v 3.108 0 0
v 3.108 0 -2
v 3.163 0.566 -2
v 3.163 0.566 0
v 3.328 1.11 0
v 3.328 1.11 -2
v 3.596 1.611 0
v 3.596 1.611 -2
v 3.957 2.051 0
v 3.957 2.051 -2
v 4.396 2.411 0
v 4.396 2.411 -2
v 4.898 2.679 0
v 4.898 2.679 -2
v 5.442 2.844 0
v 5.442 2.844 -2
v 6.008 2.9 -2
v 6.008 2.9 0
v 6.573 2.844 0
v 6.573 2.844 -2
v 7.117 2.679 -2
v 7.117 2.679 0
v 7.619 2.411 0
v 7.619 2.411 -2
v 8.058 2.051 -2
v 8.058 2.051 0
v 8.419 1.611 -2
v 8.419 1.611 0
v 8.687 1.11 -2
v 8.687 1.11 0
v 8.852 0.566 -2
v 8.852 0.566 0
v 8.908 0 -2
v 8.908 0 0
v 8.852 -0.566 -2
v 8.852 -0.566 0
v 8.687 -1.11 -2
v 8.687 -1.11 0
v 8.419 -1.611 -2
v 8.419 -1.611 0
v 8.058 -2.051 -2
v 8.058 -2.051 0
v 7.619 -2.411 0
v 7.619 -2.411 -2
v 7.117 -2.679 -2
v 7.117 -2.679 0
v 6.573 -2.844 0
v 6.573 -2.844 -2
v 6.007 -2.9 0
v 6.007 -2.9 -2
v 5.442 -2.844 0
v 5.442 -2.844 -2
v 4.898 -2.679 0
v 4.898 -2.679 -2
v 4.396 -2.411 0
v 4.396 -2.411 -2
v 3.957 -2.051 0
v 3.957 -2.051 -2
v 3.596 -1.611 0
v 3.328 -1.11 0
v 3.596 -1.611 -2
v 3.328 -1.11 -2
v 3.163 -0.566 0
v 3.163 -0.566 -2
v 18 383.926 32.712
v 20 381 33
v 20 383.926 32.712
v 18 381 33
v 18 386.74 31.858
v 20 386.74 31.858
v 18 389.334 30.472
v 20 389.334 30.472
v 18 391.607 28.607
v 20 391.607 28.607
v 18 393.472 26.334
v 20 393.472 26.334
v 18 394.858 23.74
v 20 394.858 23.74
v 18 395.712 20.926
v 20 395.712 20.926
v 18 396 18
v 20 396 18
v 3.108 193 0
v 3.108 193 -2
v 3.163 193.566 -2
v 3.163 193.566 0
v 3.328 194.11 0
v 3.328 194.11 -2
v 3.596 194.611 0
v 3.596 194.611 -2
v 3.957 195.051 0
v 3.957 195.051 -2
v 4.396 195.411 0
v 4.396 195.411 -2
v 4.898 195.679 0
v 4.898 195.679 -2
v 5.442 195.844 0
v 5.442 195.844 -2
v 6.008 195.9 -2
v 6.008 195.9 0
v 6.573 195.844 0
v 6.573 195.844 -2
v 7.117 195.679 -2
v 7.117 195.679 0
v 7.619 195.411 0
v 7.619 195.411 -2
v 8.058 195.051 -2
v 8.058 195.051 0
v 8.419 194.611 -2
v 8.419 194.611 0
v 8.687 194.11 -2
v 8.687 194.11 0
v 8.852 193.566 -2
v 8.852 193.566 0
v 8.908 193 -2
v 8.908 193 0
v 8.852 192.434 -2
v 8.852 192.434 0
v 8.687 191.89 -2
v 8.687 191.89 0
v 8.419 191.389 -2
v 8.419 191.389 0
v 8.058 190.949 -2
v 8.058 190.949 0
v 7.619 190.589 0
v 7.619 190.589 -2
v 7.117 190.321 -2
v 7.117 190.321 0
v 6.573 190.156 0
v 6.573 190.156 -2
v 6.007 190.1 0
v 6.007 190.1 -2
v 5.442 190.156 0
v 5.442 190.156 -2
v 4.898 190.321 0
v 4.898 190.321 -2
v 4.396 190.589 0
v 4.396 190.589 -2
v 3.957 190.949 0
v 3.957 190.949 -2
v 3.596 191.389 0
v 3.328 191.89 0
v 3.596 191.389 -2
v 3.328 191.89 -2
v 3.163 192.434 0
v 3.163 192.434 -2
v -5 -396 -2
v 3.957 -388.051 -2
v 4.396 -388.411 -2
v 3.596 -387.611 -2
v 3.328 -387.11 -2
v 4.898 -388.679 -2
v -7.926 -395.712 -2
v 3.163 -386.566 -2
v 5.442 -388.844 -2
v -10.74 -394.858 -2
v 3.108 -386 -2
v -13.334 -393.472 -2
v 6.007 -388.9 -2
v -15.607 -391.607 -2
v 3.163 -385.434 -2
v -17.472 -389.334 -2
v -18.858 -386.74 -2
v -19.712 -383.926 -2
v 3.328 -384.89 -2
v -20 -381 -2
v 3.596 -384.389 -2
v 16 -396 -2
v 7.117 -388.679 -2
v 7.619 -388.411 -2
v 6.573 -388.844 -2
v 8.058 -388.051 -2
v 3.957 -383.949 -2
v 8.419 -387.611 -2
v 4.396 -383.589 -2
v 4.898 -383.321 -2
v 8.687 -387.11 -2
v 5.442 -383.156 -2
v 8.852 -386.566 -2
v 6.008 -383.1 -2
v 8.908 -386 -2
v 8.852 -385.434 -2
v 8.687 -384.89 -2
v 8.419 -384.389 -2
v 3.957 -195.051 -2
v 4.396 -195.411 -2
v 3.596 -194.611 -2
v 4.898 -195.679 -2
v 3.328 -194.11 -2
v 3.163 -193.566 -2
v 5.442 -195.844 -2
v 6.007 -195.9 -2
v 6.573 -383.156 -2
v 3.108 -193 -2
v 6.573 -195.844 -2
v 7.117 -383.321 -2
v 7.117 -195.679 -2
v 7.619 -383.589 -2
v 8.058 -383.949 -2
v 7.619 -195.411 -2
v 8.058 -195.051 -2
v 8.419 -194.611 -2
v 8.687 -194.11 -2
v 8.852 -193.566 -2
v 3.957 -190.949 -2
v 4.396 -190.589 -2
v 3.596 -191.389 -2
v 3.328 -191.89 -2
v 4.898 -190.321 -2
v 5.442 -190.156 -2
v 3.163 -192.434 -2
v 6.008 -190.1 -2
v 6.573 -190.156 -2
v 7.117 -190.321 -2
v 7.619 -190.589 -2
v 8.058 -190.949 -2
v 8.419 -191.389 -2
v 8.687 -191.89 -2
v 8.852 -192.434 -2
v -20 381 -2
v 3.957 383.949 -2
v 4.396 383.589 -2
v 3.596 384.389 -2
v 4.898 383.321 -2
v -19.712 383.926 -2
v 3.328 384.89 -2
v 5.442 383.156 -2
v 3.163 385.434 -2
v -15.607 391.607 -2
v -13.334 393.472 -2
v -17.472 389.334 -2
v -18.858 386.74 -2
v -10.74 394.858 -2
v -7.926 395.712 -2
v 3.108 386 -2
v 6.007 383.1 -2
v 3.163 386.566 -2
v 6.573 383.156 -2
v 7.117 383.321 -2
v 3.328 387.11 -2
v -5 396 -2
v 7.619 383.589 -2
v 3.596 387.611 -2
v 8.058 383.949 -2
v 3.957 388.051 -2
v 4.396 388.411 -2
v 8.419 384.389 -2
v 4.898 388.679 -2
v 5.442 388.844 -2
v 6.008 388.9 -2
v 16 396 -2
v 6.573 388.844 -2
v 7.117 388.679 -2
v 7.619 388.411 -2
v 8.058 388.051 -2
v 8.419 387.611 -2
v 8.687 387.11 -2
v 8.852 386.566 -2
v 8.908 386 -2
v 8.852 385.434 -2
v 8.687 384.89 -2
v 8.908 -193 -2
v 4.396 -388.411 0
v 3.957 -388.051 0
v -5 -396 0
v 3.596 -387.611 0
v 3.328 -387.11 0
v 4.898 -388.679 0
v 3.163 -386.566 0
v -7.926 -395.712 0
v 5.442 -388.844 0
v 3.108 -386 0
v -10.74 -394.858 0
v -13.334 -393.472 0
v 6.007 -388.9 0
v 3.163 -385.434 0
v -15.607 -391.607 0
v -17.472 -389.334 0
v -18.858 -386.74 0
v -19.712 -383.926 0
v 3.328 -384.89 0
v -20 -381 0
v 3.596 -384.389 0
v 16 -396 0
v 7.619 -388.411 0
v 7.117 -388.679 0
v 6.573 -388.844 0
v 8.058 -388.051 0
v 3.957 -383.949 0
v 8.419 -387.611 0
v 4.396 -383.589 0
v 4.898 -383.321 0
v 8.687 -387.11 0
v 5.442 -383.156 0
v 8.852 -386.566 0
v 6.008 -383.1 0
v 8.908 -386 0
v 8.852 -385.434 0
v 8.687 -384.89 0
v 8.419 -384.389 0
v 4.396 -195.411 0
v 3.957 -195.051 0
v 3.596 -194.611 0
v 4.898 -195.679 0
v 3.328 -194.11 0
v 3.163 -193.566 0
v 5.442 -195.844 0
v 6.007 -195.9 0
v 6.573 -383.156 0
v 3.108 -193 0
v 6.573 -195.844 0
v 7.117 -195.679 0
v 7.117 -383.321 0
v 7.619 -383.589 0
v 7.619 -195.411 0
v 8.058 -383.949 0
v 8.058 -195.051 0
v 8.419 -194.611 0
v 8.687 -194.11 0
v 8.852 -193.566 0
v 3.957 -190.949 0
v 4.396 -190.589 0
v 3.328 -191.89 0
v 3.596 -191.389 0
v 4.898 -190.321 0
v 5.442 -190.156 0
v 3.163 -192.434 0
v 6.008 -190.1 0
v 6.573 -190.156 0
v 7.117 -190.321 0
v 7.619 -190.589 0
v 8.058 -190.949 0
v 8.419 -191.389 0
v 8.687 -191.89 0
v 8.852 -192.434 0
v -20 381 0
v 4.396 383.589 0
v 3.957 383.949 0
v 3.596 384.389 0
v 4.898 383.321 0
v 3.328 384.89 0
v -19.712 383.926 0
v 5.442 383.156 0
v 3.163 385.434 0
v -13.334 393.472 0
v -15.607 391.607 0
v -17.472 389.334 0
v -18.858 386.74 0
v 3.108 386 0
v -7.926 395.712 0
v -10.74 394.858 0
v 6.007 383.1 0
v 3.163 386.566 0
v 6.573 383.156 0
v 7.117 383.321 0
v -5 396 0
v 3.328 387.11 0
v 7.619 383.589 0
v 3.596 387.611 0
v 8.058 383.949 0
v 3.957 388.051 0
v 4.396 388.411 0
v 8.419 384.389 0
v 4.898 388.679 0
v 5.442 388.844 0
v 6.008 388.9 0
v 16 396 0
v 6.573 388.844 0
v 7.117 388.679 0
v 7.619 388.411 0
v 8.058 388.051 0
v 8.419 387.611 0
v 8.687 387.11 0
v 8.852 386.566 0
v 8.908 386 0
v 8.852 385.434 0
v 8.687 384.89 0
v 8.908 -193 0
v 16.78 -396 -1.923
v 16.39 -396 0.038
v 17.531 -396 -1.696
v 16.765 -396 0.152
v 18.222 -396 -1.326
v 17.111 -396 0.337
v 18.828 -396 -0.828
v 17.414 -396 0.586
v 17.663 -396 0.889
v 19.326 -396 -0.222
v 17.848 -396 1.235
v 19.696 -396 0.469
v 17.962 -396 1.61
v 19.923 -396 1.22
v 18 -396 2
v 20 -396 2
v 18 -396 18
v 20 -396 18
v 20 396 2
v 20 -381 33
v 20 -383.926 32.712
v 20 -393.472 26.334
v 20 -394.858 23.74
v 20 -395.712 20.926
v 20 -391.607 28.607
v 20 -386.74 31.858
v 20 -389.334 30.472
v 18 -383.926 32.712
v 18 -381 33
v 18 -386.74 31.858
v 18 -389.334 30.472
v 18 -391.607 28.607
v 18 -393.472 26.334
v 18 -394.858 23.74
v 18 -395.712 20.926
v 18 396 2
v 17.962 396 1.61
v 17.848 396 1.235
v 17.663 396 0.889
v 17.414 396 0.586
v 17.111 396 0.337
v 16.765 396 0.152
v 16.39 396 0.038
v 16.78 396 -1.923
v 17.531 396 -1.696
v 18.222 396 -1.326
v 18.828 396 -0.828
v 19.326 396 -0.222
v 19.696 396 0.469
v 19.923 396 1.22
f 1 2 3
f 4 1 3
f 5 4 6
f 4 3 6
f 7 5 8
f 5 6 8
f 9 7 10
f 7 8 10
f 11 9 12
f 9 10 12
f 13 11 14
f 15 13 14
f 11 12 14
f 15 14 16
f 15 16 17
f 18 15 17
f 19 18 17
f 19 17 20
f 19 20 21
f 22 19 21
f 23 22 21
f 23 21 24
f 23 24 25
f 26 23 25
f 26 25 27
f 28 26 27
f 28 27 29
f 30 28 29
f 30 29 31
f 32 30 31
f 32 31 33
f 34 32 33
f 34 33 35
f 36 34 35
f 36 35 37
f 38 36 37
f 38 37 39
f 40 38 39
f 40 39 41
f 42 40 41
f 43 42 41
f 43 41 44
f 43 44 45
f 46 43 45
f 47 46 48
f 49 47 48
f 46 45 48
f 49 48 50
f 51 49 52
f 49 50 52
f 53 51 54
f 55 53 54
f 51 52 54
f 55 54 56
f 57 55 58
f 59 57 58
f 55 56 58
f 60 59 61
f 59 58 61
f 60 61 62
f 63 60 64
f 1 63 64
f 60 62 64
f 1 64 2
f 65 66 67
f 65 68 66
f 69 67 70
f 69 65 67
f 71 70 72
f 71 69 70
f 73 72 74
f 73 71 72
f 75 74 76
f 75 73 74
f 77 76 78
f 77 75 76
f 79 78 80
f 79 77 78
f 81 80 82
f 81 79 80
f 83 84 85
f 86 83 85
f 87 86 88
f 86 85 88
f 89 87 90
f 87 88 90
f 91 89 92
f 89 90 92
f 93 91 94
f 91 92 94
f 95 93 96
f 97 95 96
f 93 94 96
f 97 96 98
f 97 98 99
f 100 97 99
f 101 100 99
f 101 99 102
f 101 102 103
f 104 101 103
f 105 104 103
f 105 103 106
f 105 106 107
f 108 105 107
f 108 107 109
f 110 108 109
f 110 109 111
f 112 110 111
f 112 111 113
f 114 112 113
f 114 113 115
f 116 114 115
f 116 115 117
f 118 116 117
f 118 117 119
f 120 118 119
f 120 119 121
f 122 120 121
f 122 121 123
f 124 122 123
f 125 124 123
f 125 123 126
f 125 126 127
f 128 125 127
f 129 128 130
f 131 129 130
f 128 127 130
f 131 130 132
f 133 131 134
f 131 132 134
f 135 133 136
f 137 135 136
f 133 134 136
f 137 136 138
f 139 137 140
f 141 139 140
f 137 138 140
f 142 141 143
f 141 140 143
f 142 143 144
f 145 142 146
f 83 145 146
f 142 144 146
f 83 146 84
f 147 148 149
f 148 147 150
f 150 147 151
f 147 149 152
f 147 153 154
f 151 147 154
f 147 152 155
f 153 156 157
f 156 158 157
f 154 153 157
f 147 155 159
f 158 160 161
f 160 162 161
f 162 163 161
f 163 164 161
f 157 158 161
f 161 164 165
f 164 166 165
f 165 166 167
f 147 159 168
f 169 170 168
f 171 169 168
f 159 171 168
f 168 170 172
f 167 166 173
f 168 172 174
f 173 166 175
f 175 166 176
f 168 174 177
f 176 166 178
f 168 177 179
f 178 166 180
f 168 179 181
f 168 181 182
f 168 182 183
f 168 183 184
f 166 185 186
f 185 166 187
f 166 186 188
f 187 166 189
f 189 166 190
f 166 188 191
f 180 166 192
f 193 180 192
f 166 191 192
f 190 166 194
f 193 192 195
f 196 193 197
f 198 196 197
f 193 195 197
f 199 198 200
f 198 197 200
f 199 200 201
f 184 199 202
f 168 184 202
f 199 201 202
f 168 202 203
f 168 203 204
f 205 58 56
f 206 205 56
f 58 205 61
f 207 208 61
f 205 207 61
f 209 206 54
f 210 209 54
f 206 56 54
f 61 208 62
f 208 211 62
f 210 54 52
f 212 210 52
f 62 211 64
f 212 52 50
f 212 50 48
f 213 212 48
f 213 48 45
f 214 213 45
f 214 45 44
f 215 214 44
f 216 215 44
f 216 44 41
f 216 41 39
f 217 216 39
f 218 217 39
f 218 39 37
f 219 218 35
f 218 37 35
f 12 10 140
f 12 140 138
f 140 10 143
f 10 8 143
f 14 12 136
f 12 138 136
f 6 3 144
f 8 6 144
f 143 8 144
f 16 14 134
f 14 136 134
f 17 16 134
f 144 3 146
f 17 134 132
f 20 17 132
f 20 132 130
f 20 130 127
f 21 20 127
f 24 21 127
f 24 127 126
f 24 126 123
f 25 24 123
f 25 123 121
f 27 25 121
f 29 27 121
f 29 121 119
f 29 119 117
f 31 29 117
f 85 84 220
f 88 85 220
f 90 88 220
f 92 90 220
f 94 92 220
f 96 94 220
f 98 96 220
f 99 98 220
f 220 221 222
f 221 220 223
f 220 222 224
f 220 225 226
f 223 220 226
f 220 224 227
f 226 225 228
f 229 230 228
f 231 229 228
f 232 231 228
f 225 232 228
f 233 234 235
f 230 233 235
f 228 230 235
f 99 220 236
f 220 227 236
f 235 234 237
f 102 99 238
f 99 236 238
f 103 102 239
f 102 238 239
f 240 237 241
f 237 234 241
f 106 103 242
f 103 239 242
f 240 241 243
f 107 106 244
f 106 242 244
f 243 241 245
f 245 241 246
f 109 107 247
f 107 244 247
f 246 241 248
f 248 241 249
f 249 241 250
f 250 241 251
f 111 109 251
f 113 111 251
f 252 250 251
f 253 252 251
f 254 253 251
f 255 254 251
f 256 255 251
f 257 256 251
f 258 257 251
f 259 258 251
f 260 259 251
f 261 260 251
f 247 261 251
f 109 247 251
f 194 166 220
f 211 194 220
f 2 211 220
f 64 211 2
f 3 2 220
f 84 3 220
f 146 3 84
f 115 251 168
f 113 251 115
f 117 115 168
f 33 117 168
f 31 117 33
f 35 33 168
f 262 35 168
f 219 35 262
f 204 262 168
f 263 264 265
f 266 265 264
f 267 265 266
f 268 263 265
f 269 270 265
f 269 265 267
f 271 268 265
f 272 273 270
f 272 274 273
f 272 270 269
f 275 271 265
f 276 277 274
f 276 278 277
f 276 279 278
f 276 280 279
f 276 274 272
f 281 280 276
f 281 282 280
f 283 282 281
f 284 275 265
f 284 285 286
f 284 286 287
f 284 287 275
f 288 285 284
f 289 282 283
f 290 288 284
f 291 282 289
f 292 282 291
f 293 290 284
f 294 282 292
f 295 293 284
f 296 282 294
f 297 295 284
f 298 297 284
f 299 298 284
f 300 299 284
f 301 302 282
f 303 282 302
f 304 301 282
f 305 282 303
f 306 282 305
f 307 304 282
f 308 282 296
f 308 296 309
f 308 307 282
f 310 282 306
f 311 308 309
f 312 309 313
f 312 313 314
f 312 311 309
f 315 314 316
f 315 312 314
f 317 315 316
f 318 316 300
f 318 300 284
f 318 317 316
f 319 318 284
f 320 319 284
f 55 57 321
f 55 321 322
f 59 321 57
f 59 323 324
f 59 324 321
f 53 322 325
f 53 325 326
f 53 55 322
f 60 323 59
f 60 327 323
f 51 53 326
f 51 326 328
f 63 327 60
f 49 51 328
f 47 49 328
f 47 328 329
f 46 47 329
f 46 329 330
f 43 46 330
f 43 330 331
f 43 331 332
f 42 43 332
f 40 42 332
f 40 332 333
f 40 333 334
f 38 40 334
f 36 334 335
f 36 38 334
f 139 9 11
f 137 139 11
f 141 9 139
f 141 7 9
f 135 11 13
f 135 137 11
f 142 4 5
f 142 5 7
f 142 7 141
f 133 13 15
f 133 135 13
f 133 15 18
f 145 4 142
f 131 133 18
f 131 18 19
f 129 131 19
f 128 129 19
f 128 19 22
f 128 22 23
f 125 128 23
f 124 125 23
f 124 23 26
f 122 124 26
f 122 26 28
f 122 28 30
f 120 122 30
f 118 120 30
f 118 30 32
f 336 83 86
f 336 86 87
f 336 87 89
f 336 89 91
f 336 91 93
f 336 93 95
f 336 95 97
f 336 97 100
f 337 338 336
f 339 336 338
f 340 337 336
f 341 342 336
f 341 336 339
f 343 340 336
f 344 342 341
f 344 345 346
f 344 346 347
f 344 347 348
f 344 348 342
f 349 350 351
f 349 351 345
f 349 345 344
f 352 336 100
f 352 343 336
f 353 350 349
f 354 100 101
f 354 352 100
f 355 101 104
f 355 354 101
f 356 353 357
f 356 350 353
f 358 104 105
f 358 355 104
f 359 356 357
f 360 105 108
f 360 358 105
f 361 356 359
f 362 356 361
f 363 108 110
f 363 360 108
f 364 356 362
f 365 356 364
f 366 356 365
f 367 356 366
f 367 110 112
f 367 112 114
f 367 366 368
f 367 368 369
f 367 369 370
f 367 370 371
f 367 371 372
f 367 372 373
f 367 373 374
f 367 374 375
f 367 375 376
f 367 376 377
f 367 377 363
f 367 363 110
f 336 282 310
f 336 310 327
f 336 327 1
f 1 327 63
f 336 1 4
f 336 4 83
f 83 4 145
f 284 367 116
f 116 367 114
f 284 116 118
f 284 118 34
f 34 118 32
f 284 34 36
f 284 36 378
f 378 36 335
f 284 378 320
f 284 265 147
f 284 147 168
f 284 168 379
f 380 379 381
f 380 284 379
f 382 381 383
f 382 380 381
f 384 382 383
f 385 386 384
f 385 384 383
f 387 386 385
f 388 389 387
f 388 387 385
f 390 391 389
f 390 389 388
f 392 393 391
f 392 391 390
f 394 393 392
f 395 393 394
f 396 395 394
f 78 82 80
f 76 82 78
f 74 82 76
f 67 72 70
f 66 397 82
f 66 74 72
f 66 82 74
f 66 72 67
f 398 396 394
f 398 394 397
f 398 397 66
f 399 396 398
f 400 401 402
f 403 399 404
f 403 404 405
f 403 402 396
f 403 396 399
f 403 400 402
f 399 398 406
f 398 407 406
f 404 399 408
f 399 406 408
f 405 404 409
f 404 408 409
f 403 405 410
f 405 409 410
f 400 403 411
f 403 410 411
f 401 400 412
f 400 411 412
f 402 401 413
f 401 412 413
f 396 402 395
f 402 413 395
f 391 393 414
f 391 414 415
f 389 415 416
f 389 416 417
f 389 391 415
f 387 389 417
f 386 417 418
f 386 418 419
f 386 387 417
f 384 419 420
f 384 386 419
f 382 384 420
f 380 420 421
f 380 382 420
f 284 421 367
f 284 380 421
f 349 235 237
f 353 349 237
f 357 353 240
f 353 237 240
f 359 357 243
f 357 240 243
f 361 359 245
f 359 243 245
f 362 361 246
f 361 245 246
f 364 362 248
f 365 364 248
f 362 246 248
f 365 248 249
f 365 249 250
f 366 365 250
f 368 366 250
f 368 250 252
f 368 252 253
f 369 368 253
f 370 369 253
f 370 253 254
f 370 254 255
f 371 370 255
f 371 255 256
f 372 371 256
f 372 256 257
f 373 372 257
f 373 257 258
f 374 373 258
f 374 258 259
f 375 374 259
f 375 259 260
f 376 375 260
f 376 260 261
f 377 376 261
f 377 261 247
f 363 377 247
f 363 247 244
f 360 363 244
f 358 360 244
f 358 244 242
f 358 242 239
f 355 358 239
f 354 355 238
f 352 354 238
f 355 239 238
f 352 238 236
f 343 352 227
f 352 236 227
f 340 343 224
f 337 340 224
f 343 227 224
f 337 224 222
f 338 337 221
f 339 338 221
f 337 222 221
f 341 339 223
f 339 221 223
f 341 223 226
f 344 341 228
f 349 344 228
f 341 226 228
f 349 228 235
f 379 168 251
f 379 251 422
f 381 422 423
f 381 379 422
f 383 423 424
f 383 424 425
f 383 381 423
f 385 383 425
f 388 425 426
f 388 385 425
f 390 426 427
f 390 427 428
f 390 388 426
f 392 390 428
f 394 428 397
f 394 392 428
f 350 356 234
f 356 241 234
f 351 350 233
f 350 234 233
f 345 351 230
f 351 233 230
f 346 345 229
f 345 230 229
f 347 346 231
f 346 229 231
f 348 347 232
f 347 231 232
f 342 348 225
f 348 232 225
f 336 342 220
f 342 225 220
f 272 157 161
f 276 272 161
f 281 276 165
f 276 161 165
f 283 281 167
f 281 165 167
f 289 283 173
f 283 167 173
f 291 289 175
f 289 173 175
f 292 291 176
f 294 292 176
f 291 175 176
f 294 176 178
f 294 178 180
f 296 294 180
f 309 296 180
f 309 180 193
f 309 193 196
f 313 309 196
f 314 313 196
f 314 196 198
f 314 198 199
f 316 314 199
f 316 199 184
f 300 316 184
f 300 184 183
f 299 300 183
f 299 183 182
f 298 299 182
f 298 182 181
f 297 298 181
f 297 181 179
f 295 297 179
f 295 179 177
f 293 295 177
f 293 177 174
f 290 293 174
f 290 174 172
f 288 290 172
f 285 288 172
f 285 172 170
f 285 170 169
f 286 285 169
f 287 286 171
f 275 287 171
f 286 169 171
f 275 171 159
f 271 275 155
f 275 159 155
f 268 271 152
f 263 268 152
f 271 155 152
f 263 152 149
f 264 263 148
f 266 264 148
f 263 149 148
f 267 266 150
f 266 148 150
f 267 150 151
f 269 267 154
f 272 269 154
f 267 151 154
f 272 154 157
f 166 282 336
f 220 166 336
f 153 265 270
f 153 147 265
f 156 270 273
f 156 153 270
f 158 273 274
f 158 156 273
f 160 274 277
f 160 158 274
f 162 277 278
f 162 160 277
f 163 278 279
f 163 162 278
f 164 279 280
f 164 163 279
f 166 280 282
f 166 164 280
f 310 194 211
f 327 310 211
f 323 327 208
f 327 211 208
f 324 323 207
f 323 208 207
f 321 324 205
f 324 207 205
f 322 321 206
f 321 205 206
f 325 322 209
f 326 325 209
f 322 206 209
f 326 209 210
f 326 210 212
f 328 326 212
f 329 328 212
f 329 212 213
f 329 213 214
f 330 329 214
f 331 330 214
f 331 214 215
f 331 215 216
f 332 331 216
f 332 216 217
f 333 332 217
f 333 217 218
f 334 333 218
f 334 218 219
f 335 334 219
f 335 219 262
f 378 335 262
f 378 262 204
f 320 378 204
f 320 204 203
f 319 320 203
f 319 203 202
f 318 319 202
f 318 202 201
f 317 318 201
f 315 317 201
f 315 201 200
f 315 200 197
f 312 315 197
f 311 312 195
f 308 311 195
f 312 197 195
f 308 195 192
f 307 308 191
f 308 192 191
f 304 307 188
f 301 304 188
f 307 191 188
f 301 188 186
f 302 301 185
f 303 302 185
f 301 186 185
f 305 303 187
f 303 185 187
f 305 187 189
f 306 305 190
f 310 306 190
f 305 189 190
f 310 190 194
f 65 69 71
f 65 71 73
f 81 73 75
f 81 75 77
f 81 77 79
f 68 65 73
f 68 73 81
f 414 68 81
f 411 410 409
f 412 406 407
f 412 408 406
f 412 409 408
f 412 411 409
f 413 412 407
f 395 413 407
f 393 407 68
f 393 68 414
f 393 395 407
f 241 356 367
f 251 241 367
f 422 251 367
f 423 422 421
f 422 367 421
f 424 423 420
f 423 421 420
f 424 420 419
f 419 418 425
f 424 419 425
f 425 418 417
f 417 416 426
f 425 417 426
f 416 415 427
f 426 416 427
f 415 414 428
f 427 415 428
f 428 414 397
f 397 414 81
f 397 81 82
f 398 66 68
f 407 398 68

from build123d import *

# Parameters (mm, degrees)
SKETCH2_W                    = 40
SKETCH2_H                    = 792
BASE_FLANGE1_DEPTH           = 2
EDGE_FLANGE1_STRIP_W         = 12
EDGE_FLANGE1_STRIP_H         = 2
EDGE_FLANGE1_STRIP_CUT_DEPTH = 792
EDGE_FLANGE1_DEPTH           = 792
M5_CLEARANCE_HOLE1_D         = 5.8
LPATTERN1_COUNT              = 5
LPATTERN1_PITCH              = 193
FILLET1_R                    = 15


# Sheet-metal steps are written as plain solids
with BuildPart() as part:
    # Sketch2 → Base-Flange1 (new body)
    with BuildSketch(Plane.XY):
        Rectangle(SKETCH2_W, SKETCH2_H)
    extrude(amount=-BASE_FLANGE1_DEPTH)

    # Edge-Flange1 strip (across the edge) → Edge-Flange1 strip cut (cut)
    with BuildSketch(Plane(origin=(20, -396, 0), x_dir=(-1, 0, 0), z_dir=(0, 1, 0))):
        with Locations((-2, -1)):
            Rectangle(EDGE_FLANGE1_STRIP_W, EDGE_FLANGE1_STRIP_H)
    extrude(amount=EDGE_FLANGE1_STRIP_CUT_DEPTH, mode=Mode.SUBTRACT)

    # Edge-Flange1 section (across the edge) → Edge-Flange1 (add)
    with BuildSketch(Plane(origin=(20, -396, 0), x_dir=(-1, 0, 0), z_dir=(0, 1, 0))):
        with BuildLine():
            Line((0, 2), (0, 33))
            Line((0, 33), (2, 33))
            Line((2, 33), (2, 2))
            ThreePointArc((2, 2), (2.585786438, 0.585786438), (4, 0))
            Line((4, 0), (4, -2))
            ThreePointArc((4, -2), (1.171572875, -0.828427125), (0, 2))
        make_face()
    extrude(amount=EDGE_FLANGE1_DEPTH)

    # M5 Clearance Hole1 (through all)
    with Locations(Plane.XY):
        with Locations((6.0075, -386)):
            m5_clearance_hole1 = Hole(M5_CLEARANCE_HOLE1_D / 2)

    # LPattern1: M5 Clearance Hole1 ×5
    with Locations(*[(0, i * LPATTERN1_PITCH, 0) for i in range(1, LPATTERN1_COUNT)]):
        add(m5_clearance_hole1, mode=Mode.SUBTRACT)

    # Fillet1
    fillet1_edges = [part.edges().sort_by_distance(p)[0] for p in [
        (19, -396, 33),
        (19, 396, 33),
        (-20, -396, -1),
        (-20, 396, -1),
    ]]
    fillet(fillet1_edges, radius=FILLET1_R)


solid = part.part
